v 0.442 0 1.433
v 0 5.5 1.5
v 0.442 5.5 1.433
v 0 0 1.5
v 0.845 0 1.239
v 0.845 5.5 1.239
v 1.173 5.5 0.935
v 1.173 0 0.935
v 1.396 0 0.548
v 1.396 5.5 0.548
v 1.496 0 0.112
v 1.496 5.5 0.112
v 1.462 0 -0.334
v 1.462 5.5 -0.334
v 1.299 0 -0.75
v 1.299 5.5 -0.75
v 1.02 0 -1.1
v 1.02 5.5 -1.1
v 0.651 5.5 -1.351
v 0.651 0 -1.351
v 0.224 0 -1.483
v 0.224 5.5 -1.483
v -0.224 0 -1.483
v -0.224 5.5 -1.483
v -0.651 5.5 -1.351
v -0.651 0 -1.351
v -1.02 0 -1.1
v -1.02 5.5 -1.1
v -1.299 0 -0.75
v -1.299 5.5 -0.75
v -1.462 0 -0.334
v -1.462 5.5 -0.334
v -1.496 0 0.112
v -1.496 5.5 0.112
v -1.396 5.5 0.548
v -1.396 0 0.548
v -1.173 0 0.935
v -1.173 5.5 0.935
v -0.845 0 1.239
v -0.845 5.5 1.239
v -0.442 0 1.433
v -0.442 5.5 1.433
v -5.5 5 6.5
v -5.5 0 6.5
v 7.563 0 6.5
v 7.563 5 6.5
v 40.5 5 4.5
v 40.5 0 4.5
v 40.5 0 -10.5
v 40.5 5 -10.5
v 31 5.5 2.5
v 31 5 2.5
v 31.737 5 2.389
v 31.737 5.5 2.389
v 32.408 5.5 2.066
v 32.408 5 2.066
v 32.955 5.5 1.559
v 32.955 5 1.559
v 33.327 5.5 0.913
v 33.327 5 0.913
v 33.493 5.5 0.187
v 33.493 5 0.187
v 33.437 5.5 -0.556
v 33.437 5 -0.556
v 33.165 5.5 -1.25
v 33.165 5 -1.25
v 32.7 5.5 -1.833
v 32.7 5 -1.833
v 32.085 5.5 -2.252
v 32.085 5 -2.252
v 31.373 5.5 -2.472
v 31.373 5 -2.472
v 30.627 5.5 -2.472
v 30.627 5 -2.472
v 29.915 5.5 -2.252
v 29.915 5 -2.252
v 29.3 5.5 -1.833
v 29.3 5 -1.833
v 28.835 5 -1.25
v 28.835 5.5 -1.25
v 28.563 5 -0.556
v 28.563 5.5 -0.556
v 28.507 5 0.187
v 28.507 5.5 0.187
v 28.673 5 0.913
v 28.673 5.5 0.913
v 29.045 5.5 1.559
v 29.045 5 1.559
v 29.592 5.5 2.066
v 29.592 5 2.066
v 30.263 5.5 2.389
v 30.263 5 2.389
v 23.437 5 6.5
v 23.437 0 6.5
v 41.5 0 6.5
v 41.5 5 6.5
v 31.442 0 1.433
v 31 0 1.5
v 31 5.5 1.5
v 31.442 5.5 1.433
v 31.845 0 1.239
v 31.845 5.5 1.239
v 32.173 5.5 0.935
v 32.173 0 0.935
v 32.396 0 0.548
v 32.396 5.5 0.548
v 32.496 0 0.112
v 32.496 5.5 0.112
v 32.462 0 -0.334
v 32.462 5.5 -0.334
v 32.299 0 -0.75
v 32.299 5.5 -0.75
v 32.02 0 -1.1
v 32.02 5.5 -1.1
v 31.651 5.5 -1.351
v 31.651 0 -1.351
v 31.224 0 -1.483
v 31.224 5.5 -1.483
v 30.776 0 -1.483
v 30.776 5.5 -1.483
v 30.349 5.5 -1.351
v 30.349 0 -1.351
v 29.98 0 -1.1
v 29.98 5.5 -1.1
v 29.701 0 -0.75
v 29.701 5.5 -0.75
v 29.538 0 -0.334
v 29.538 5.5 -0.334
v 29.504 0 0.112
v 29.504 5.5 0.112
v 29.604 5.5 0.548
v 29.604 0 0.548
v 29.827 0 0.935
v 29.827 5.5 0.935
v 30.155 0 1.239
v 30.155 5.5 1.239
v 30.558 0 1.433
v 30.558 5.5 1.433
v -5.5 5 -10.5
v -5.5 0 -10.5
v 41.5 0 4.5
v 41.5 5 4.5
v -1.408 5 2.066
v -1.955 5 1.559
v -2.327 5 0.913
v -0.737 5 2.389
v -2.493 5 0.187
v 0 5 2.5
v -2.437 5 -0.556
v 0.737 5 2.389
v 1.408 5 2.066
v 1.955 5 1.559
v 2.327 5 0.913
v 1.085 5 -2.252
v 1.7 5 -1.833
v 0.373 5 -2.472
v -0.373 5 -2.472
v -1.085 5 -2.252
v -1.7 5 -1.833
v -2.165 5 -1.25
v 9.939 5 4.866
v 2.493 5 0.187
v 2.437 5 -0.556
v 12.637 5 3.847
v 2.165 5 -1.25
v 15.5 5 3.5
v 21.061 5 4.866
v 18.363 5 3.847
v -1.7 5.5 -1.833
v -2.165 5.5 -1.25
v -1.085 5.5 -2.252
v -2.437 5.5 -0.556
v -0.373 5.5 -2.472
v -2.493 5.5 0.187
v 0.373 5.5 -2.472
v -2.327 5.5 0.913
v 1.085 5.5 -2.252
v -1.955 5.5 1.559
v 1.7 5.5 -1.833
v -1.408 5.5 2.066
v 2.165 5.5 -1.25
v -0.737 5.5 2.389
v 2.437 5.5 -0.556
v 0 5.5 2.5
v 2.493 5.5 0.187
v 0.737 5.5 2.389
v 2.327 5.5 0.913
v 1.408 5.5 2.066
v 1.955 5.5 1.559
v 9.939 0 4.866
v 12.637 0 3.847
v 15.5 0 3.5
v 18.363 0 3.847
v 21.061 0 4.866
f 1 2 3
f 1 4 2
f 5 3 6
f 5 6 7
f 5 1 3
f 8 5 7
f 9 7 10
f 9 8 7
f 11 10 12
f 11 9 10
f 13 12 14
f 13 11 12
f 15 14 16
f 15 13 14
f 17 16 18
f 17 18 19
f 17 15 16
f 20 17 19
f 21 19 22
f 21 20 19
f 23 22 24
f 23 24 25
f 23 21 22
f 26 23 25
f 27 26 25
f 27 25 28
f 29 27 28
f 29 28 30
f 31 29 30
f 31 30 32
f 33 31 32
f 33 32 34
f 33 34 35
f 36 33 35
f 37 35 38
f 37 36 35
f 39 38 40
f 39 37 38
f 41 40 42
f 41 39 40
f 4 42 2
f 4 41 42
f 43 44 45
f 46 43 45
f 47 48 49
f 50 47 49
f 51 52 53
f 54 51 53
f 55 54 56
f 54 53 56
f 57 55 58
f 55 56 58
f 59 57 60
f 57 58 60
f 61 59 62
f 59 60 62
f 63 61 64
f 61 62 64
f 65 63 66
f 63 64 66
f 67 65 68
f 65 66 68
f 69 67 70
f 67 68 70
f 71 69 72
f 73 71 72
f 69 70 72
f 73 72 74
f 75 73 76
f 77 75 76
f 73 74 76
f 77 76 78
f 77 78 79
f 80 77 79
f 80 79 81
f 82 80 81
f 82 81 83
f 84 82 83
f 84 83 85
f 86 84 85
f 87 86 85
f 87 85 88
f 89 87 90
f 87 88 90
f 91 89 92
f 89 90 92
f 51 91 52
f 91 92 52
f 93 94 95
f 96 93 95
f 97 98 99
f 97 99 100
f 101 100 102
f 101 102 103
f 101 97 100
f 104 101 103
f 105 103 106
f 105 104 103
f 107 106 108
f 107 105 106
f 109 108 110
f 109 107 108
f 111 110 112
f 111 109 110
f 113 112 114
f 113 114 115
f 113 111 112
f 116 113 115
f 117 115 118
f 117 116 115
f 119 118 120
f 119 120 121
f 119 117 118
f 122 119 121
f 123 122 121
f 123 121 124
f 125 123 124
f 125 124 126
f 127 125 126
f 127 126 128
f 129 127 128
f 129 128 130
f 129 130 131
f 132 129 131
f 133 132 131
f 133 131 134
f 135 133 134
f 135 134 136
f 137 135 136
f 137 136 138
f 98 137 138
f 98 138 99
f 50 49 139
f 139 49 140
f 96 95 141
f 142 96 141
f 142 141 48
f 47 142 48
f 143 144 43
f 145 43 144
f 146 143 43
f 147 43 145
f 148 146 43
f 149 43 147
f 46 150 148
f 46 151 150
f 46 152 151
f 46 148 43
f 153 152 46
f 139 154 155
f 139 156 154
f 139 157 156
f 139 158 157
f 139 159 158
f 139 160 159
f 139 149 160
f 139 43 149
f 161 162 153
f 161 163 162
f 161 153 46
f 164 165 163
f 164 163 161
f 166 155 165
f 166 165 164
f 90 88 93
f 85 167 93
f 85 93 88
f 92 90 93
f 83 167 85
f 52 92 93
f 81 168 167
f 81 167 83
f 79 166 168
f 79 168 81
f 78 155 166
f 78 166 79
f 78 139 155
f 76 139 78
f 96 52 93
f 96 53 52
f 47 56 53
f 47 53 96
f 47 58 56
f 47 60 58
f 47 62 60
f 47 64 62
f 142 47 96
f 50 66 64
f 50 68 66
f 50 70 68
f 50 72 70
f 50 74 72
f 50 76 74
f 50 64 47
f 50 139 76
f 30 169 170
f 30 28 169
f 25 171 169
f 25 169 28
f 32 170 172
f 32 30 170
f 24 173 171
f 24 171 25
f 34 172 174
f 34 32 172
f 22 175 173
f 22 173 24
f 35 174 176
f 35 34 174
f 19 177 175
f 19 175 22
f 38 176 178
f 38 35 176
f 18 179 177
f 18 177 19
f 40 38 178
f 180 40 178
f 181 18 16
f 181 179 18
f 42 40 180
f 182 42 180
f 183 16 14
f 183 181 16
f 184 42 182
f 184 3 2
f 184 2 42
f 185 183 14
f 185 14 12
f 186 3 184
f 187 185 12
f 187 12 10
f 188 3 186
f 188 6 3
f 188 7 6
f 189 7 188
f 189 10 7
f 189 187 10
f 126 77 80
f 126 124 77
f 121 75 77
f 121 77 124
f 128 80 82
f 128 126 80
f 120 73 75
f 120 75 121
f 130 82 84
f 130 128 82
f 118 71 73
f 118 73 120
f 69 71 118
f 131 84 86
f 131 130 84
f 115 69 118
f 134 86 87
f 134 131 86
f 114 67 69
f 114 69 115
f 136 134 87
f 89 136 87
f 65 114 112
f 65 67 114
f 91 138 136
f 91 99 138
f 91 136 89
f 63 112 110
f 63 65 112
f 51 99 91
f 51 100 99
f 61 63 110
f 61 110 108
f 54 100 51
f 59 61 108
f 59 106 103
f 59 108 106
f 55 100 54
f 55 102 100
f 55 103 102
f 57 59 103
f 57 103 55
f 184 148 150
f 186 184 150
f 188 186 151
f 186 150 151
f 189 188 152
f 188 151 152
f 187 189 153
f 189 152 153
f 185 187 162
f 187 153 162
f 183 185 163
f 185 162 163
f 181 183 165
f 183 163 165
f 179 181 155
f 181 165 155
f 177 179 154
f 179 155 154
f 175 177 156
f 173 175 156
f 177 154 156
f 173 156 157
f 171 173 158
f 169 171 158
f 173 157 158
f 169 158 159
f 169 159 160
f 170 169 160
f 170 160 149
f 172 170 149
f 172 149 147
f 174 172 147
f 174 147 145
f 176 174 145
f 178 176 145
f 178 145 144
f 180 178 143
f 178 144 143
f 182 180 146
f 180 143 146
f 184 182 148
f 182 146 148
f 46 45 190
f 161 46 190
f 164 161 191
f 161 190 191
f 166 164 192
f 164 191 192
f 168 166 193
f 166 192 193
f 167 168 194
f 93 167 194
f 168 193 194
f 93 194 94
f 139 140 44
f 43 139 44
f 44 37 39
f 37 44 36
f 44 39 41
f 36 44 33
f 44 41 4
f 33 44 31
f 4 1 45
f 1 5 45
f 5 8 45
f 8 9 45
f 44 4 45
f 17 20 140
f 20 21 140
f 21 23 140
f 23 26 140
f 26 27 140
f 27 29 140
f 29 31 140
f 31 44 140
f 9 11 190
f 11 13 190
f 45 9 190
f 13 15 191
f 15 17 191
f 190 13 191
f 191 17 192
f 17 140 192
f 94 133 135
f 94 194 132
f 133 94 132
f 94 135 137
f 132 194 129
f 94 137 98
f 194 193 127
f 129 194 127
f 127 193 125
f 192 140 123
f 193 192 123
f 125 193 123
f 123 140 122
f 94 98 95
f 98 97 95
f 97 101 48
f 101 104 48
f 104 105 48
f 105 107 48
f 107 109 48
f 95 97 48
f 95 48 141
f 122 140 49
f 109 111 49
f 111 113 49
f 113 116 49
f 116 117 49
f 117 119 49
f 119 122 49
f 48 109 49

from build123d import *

# Parameters (mm, degrees)
SKETCH1_R           = 1.5
BOSS_EXTRUDE1_DEPTH = 5
SKETCH2_R           = 2.5
SKETCH2_R_2         = 1.5
BOSS_EXTRUDE2_DEPTH = 0.5


with BuildPart() as part:
    # Sketch1 → Boss-Extrude1 (new body)
    with BuildSketch(Plane(origin=(0, 0, 0), x_dir=(1, 0, 0), z_dir=(0, 1, 0))):
        with BuildLine():
            Line((40.5, -6.5), (41.5, -6.5))
            Line((41.5, -6.5), (41.5, -4.5))
            Line((41.5, -4.5), (40.5, -4.5))
            Line((40.5, -4.5), (40.5, 10.5))
            Line((40.5, 10.5), (-5.5, 10.5))
            Line((-5.5, 10.5), (-5.5, -6.5))
            Line((-5.5, -6.5), (7.562746067, -6.5))
            ThreePointArc((7.562746067, -6.5), (15.5, -3.5), (23.437253933, -6.5))
            Line((23.437253933, -6.5), (40.5, -6.5))
        make_face()
        with Locations(Location((0, 0, 0), (0, 0, 270))):
            Circle(SKETCH1_R, mode=Mode.SUBTRACT)
        with Locations(Location((31, 0, 0), (0, 0, 270))):
            Circle(SKETCH1_R, mode=Mode.SUBTRACT)
    extrude(amount=BOSS_EXTRUDE1_DEPTH)

    # Sketch2 → Boss-Extrude2 (add)
    # profile 1 of 2: a face of its own
    with BuildSketch(Plane(origin=(0, 5, 0), x_dir=(1, 0, 0), z_dir=(0, 1, 0))):
        with Locations(Location((0, 0, 0), (0, 0, 270))):
            Circle(SKETCH2_R)
        with Locations(Location((0, 0, 0), (0, 0, 270))):
            Circle(SKETCH2_R_2, mode=Mode.SUBTRACT)
    # profile 2 of 2: a face of its own
    with BuildSketch(Plane(origin=(0, 5, 0), x_dir=(1, 0, 0), z_dir=(0, 1, 0))):
        with Locations(Location((31, 0, 0), (0, 0, 270))):
            Circle(SKETCH2_R)
        with Locations(Location((31, 0, 0), (0, 0, 270))):
            Circle(SKETCH2_R_2, mode=Mode.SUBTRACT)
    extrude(amount=BOSS_EXTRUDE2_DEPTH)


solid = part.part
